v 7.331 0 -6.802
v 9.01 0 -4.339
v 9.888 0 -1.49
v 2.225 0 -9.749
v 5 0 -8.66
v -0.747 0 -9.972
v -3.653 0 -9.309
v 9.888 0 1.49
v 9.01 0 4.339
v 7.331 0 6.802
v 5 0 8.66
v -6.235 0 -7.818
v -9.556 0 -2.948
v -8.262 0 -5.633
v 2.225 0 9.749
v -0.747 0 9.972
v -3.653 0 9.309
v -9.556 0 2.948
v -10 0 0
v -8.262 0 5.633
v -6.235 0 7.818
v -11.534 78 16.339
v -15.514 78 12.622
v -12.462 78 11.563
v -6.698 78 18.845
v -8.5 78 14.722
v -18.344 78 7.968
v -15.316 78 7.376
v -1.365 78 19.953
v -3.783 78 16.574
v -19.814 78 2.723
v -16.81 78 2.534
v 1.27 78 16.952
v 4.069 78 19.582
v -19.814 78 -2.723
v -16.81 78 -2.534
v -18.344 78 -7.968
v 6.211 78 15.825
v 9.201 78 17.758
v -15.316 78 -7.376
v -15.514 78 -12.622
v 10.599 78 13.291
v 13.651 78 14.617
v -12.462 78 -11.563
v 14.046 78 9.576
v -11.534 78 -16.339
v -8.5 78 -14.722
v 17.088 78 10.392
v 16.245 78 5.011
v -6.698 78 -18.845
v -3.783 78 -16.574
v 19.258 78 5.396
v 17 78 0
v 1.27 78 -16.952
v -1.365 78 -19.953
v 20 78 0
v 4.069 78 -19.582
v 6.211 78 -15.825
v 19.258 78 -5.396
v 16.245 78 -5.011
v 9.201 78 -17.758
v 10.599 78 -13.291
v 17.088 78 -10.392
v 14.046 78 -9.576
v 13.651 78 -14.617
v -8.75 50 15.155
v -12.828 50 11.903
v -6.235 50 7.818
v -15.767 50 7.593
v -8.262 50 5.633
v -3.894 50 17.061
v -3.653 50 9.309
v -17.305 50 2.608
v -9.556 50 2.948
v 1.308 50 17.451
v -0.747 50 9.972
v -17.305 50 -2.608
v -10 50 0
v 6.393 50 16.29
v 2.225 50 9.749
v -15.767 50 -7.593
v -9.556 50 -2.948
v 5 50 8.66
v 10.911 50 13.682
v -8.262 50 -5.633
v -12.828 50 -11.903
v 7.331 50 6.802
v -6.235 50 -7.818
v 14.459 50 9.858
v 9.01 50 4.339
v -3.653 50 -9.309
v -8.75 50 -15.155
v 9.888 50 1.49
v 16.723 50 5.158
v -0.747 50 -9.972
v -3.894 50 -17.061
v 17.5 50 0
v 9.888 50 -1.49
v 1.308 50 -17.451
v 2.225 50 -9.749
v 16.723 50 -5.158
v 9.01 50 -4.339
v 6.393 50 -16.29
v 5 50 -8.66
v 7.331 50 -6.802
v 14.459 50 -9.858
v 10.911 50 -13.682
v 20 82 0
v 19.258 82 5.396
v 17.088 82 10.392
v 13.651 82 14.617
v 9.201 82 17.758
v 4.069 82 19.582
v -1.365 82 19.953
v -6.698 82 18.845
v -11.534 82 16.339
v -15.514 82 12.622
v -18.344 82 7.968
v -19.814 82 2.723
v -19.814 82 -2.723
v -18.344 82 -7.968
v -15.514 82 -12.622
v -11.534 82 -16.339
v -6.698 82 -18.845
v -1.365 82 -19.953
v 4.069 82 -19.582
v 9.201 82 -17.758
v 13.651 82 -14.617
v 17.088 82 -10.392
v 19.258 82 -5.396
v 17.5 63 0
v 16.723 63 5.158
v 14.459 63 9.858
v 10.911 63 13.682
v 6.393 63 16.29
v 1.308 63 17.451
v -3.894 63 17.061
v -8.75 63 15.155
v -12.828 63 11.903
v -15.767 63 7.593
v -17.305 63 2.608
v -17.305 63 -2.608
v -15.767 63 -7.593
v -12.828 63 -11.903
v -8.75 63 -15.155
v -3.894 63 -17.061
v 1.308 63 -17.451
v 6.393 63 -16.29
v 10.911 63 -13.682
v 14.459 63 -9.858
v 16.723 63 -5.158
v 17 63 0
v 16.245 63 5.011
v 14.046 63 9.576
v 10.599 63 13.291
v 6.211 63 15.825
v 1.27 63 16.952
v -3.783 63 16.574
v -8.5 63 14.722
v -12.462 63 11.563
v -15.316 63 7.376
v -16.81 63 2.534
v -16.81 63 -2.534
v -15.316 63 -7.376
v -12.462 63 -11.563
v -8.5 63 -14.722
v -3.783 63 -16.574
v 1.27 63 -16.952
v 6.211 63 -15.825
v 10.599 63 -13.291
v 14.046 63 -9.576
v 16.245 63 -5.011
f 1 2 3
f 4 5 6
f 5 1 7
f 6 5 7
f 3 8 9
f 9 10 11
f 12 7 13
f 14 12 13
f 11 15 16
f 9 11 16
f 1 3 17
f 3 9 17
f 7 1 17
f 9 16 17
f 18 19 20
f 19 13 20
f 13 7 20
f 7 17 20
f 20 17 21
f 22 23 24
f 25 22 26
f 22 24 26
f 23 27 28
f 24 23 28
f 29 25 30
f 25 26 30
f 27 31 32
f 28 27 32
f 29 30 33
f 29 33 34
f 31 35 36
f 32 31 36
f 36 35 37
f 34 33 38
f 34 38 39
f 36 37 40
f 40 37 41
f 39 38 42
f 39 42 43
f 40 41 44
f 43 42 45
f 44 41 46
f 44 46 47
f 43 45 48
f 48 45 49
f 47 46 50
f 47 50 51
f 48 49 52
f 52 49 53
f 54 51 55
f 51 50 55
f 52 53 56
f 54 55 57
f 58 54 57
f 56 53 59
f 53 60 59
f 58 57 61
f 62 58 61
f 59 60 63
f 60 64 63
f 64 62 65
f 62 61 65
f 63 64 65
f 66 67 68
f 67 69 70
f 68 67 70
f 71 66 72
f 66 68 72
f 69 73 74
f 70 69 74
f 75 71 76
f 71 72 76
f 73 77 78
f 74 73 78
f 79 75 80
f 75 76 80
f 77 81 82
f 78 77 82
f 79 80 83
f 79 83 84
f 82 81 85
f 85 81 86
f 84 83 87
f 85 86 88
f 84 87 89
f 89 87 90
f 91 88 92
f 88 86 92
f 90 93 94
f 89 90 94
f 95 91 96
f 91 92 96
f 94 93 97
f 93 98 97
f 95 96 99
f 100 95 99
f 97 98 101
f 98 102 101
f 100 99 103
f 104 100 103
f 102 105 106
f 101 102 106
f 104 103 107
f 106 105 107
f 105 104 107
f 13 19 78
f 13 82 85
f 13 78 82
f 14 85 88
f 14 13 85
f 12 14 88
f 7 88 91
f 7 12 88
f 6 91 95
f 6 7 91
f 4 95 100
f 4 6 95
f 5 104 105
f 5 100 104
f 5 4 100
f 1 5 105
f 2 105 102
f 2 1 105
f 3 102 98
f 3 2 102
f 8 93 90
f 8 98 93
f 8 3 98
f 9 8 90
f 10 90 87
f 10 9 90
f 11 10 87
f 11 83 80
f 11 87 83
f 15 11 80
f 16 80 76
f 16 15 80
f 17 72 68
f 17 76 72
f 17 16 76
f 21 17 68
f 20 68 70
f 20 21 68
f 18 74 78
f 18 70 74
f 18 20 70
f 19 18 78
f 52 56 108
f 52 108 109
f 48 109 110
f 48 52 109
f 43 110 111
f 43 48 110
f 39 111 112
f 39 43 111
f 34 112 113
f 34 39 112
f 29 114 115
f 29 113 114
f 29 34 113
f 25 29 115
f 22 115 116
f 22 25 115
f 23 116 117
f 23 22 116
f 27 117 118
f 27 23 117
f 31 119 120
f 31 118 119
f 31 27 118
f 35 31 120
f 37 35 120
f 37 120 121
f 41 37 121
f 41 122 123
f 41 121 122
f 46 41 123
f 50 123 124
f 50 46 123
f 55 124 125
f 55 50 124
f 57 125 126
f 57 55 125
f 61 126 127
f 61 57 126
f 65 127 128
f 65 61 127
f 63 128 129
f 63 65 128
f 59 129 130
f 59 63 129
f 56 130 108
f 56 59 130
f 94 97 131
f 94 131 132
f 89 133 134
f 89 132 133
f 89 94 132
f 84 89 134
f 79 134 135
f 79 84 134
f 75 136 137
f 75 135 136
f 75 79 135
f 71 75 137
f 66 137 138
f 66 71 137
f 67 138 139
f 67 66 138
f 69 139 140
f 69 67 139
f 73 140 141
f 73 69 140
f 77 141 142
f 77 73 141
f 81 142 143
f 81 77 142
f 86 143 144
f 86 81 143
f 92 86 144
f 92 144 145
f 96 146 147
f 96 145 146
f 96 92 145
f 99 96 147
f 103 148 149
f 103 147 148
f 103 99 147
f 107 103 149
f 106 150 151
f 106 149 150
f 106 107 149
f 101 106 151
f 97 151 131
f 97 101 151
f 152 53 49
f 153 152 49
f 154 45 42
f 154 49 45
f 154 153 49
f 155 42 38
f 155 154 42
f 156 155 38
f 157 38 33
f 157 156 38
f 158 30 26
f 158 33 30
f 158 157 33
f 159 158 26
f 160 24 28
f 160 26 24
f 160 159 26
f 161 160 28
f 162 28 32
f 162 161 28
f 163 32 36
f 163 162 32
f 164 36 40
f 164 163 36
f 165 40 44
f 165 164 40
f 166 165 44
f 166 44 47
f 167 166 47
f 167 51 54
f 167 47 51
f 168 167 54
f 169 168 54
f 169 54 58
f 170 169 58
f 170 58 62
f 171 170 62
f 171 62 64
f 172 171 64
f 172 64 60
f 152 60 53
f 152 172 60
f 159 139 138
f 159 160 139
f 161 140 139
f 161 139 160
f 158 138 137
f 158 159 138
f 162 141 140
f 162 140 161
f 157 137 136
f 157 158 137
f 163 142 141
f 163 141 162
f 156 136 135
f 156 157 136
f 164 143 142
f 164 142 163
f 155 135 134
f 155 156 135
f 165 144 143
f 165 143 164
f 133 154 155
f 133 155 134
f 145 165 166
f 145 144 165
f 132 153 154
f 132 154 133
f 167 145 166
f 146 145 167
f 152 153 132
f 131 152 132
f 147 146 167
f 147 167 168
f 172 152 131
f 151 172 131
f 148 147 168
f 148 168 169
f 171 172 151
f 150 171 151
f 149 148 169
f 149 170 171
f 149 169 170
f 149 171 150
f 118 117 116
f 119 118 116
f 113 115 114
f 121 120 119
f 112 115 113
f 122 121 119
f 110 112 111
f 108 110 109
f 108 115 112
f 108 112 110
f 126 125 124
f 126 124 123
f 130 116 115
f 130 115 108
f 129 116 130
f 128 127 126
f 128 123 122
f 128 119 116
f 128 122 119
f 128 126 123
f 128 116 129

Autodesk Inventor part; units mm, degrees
ref_plane "YZ Plane" through (0, 0, 0) normal (1, 0, 0) x (0, 1, 0)
ref_plane "XZ Plane" through (0, 0, 0) normal (0, 1, 0) x (-1, 0, 0)
ref_plane "XY Plane" through (0, 0, 0) normal (0, 0, 1) x (1, 0, 0)
sketch "Sketch1" plane through (0, 0, 0) normal (0, 1, 0) x (-1, 0, 0)
  circle A0 centre (0, 0) radius 10
  dimension "d0" = 20
extrude "Extrusion1" add sketch "Sketch1" along normal blind 50
sketch "Sketch2" plane through (0, 50, 0) normal (0, 1, 0) x (1, 0, 0)
  circle A0 centre (0, 0) radius 17.5
  dimension "d3" = 35
extrude "Extrusion2" add sketch "Sketch2" along normal blind 13
sketch "Sketch3" plane through (0, 63, 0) normal (0, 1, 0) x (1, 0, 0)
  circle A0 centre (0, 0) radius 17
  dimension "d6" = 34
extrude "Extrusion3" add sketch "Sketch3" along normal blind 15
sketch "Sketch4" plane through (0, 78, 0) normal (0, 1, 0) x (1, 0, 0)
  circle A0 centre (0, 0) radius 20
  dimension "d9" = 40
extrude "Extrusion4" add sketch "Sketch4" along normal blind 4
sketch "Sketch5" plane through (0, 82, 0) normal (0, 1, 0) x (1, 0, 0)
  point P0 (0, 0)
properties part number "estop"
